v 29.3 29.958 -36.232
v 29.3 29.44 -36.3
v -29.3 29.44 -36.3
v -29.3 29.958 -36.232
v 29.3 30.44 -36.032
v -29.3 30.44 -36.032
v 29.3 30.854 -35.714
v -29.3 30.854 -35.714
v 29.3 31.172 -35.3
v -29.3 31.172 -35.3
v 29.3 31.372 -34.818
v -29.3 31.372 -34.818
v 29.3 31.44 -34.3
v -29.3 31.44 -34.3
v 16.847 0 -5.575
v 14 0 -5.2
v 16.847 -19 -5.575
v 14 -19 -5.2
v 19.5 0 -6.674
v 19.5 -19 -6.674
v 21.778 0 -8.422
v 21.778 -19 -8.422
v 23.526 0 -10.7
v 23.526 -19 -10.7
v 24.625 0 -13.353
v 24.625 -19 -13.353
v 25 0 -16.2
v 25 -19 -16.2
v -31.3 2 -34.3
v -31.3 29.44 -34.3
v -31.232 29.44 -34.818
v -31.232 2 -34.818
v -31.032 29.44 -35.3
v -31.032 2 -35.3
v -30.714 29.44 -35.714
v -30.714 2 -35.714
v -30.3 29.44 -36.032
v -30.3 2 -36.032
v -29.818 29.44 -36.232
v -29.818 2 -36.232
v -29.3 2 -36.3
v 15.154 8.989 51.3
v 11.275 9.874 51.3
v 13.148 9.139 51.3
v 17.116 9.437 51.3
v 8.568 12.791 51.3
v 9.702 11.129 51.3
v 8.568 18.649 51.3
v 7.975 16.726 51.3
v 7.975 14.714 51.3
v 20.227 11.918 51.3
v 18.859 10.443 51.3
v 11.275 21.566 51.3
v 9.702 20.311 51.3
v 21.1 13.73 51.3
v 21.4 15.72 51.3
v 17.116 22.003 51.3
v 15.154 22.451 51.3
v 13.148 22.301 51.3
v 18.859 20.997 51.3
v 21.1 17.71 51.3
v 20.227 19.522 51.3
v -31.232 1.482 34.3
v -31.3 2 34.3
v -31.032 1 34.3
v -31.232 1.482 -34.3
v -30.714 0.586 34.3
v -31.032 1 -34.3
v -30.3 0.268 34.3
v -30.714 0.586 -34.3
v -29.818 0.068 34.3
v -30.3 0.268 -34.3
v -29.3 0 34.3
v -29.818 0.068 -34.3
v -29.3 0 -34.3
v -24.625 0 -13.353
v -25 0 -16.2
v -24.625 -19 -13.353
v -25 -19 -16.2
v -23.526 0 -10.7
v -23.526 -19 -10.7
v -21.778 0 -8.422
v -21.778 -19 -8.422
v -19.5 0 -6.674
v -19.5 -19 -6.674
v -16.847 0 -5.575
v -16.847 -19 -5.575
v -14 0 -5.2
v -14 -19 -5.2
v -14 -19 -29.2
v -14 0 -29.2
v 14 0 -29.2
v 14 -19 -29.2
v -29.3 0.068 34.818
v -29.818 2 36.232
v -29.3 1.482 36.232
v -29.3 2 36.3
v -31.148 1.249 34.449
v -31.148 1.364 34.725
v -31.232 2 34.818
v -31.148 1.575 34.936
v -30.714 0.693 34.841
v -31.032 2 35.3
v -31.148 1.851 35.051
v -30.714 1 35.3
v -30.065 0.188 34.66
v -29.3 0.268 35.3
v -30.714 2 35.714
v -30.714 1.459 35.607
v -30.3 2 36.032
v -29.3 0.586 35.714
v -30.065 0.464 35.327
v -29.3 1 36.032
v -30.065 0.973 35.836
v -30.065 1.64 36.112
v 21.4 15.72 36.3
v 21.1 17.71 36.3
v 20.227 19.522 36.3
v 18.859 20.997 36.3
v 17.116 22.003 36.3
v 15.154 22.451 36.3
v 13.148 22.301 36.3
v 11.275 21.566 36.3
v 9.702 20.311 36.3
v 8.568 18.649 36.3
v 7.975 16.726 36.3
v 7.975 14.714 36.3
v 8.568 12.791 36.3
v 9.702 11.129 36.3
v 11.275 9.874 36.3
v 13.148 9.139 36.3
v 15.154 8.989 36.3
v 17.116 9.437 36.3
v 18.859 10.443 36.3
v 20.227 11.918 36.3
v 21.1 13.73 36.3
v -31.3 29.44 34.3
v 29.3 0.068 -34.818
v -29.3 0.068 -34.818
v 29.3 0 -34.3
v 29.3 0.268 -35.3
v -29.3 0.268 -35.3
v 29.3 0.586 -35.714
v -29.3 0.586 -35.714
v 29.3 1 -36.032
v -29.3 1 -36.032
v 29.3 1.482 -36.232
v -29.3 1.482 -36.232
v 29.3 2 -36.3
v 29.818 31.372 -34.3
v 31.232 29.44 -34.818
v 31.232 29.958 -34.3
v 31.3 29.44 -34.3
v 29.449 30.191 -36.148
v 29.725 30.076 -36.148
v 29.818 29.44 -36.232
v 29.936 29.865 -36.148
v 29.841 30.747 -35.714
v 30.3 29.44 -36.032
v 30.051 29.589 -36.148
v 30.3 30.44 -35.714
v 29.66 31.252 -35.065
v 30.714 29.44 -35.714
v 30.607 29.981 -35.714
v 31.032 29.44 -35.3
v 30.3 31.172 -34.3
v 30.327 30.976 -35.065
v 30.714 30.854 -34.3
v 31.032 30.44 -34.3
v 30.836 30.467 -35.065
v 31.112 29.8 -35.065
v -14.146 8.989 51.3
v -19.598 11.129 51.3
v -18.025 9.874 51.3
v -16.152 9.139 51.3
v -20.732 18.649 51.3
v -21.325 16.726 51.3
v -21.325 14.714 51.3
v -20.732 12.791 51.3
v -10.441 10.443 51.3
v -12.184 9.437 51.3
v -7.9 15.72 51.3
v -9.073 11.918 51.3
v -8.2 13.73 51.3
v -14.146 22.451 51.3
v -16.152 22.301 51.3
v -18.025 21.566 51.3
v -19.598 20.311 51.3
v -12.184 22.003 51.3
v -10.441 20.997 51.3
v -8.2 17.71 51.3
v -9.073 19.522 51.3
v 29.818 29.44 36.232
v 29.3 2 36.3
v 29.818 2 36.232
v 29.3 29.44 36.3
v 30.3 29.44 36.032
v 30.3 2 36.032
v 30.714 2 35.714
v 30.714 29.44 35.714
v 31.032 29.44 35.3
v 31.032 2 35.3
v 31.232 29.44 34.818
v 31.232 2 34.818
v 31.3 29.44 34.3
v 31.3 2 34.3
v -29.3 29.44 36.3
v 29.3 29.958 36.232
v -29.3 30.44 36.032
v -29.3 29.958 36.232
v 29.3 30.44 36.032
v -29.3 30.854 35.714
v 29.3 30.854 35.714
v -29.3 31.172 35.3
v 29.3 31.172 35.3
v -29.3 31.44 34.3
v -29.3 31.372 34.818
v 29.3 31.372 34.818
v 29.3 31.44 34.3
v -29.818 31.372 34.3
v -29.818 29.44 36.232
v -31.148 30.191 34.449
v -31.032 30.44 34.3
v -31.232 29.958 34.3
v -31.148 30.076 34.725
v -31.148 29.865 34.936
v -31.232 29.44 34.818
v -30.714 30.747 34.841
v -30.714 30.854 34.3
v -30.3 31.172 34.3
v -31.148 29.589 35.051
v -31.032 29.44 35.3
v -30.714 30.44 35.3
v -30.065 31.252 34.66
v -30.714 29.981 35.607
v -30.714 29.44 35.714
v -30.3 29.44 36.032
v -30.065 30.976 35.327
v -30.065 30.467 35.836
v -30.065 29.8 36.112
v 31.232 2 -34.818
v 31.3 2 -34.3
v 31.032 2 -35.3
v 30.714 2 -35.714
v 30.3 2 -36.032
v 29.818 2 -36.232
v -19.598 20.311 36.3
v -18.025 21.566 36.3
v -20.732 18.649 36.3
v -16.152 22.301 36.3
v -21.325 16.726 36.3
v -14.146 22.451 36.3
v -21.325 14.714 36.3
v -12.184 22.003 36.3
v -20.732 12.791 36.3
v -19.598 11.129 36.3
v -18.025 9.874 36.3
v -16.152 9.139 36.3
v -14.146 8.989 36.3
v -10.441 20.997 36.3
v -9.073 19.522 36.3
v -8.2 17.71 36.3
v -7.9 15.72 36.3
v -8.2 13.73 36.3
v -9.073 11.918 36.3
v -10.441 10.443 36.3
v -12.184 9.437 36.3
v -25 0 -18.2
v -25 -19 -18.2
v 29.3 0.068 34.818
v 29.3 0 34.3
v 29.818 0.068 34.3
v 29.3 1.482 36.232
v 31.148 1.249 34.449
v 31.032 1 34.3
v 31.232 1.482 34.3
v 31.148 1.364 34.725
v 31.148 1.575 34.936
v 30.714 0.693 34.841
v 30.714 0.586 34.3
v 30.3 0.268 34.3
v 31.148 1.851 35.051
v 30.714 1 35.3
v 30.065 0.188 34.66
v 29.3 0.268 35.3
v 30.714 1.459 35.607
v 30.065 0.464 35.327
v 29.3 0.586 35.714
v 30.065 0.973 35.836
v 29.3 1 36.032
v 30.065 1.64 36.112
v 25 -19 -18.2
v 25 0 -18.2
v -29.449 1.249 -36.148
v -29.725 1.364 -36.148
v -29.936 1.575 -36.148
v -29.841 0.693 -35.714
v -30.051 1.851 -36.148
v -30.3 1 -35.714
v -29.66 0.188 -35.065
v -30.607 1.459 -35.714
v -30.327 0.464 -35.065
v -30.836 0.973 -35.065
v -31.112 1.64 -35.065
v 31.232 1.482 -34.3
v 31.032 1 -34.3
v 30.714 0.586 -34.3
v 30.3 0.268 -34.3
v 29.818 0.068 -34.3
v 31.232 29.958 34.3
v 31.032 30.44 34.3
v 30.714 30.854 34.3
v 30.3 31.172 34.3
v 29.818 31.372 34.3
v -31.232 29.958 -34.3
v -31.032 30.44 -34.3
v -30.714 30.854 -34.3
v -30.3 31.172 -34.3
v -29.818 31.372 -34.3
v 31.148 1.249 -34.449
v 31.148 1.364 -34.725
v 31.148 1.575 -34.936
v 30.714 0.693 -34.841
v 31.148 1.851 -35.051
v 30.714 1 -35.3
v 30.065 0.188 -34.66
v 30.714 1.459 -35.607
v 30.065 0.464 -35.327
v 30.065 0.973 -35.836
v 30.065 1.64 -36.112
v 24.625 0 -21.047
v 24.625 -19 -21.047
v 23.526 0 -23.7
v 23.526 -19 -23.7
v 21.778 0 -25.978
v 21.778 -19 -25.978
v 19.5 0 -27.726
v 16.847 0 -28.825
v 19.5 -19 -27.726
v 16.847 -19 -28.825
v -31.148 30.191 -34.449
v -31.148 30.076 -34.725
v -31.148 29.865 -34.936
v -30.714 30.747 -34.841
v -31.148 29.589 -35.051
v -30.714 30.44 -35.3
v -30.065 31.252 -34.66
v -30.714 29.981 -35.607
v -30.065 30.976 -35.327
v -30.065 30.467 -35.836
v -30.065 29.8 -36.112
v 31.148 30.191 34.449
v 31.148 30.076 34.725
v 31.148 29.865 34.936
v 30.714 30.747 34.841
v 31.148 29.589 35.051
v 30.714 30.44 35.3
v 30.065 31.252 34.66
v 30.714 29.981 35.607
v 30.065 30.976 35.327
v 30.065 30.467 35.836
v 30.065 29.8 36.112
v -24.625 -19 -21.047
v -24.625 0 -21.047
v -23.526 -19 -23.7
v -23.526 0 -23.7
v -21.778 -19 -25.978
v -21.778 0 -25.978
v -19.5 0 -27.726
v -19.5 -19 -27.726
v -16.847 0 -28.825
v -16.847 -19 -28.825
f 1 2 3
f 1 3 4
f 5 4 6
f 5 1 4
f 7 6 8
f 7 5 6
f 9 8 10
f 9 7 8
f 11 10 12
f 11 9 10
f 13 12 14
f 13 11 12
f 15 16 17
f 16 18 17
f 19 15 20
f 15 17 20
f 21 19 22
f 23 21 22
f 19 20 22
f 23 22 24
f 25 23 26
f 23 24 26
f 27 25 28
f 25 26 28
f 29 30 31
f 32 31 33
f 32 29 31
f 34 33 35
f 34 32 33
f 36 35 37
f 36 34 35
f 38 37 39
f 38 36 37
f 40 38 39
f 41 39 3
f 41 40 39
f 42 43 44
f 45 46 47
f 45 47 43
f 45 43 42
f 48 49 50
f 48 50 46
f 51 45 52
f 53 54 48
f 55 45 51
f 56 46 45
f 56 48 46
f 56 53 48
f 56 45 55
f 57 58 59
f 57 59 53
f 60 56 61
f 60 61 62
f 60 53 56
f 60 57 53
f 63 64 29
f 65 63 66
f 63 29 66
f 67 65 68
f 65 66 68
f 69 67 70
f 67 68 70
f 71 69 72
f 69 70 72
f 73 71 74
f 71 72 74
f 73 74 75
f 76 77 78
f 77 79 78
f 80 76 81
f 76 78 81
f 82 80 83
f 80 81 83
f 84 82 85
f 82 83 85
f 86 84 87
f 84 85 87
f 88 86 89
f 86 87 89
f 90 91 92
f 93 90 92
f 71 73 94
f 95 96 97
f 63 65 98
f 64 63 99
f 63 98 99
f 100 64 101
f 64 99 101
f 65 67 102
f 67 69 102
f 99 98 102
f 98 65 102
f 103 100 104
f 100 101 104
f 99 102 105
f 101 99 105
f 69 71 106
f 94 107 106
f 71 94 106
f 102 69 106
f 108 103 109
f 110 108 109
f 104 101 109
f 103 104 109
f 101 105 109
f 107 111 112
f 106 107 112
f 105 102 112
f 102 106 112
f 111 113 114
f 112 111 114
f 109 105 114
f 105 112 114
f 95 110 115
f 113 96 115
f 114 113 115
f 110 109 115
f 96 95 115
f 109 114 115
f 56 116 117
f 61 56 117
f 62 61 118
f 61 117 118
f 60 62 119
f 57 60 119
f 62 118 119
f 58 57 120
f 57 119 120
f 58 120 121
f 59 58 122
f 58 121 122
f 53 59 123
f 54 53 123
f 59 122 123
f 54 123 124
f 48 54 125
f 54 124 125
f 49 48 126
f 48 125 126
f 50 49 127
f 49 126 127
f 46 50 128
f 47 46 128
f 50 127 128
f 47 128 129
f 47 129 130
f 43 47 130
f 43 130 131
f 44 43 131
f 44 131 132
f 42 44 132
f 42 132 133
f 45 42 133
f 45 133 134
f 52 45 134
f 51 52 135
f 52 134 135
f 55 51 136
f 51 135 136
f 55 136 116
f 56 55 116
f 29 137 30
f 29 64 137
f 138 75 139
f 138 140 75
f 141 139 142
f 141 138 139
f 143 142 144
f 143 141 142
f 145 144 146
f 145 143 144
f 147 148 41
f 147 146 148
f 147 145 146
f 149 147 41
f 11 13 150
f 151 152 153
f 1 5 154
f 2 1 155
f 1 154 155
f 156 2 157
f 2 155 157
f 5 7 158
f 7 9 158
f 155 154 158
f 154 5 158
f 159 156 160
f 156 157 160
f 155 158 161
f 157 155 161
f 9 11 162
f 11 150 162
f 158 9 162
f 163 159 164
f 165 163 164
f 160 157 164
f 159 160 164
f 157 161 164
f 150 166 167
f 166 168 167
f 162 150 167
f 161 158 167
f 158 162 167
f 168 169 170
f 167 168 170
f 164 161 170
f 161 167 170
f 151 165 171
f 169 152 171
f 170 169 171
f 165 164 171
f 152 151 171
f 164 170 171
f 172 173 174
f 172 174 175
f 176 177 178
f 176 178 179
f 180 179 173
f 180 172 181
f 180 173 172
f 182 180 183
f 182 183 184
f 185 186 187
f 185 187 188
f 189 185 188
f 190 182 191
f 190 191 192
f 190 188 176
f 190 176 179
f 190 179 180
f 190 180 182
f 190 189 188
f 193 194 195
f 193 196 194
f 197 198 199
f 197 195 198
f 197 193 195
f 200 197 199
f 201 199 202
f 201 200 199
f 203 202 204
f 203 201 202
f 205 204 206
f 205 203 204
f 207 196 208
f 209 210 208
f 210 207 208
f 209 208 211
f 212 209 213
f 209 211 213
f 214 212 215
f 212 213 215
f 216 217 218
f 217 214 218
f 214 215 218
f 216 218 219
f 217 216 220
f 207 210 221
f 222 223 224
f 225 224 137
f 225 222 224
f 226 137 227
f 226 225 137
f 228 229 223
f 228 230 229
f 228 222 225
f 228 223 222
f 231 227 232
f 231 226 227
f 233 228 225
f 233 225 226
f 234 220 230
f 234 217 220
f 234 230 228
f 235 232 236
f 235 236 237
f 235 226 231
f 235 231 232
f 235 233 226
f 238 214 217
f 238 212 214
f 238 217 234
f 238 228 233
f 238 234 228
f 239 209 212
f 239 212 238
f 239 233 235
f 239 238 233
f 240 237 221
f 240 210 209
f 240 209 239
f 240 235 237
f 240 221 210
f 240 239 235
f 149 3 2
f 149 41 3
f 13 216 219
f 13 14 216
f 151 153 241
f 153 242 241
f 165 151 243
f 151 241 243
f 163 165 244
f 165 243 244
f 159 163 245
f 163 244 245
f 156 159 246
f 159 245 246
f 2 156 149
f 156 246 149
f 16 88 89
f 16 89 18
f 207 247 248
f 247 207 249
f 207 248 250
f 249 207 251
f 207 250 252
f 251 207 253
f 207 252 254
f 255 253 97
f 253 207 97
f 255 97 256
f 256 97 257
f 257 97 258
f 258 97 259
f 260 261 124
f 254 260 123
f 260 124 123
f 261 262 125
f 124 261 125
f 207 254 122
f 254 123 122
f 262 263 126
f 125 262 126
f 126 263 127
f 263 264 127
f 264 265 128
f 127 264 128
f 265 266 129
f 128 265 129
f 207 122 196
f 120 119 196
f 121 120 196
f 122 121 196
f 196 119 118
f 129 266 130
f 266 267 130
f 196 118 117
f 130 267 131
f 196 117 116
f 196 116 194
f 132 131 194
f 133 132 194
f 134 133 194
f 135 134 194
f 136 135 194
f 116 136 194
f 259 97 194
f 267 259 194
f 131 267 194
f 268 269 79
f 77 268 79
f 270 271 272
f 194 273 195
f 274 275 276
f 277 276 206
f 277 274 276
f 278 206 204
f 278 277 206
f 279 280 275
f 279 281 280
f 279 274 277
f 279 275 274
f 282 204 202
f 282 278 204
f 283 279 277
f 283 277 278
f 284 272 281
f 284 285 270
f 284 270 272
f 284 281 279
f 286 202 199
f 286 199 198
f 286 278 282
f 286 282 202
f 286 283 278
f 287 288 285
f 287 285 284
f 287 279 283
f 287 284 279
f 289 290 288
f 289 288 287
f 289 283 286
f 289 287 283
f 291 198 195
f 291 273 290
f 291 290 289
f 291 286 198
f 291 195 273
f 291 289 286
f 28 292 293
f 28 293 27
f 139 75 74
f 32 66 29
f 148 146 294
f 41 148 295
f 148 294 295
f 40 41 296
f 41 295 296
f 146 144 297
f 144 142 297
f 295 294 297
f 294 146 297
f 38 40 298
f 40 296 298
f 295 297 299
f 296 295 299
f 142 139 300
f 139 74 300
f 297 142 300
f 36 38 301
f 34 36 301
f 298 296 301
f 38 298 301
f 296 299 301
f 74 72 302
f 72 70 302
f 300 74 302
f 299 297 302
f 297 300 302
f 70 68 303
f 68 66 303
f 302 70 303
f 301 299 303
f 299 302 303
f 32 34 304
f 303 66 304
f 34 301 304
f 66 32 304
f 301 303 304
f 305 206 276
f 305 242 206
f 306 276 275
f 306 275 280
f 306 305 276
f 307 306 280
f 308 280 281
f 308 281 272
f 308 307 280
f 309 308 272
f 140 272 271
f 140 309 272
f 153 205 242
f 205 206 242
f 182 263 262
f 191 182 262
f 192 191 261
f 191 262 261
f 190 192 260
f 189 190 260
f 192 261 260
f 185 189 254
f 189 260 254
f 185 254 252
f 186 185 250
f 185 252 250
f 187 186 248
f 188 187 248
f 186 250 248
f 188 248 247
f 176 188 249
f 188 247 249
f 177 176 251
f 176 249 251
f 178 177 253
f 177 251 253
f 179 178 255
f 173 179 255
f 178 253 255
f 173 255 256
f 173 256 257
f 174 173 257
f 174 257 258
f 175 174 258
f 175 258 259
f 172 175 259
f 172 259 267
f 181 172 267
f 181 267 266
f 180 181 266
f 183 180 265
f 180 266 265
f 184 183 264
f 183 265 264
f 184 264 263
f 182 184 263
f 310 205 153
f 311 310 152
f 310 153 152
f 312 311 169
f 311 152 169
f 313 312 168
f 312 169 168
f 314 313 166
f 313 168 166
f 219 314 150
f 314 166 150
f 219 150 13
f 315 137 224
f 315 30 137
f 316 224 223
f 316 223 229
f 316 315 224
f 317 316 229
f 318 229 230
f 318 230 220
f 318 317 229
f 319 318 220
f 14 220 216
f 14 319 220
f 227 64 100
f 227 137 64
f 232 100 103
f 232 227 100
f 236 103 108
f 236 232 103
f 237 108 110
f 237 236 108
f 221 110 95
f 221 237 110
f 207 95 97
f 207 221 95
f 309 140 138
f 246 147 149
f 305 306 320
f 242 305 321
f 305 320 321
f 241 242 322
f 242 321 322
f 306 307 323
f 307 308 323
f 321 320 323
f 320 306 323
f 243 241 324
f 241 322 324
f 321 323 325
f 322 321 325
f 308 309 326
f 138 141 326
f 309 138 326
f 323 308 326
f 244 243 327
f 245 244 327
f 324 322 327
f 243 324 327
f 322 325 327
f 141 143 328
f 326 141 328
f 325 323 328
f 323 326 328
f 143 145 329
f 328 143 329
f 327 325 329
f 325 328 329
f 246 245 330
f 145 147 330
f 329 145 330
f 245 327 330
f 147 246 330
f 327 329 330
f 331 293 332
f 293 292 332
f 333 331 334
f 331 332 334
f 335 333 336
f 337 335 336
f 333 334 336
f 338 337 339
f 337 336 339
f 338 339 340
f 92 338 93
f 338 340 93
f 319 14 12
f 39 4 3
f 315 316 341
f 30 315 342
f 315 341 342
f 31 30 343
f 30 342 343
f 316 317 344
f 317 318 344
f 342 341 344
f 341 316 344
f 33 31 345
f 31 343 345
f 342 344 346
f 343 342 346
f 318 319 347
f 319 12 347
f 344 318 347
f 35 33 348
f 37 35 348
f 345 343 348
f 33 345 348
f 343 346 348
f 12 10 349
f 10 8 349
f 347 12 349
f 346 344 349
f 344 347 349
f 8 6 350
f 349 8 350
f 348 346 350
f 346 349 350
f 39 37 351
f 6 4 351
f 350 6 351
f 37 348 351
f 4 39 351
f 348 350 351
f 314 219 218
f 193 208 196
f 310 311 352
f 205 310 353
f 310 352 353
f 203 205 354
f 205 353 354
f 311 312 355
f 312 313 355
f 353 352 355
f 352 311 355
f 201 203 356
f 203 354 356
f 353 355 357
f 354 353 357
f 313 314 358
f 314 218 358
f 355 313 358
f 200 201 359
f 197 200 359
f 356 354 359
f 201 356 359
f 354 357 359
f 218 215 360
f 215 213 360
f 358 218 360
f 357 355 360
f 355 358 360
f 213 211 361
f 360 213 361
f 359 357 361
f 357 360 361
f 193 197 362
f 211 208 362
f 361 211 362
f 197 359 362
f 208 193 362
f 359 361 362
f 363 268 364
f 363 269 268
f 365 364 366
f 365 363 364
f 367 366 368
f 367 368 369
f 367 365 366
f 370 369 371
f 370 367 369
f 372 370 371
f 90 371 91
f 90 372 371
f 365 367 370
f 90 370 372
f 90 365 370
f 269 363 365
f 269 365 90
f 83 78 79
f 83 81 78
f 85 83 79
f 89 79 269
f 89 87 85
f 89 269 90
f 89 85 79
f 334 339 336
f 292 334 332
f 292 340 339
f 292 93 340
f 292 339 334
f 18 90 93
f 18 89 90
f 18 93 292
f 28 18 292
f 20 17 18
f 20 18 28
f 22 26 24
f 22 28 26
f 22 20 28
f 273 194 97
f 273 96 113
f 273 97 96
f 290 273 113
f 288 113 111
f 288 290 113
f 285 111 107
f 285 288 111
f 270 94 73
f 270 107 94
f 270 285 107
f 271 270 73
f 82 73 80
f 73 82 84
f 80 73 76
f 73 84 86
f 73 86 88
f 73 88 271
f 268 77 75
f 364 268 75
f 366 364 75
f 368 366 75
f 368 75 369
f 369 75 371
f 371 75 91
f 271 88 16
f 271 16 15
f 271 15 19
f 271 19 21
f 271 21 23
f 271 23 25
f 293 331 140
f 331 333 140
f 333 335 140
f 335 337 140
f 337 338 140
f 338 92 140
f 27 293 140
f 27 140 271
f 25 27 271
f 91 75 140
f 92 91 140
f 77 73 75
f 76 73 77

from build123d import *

# Parameters (mm, degrees)
SKETCH1_W           = 62.6
SKETCH1_H           = 72.6
BOSS_EXTRUDE1_DEPTH = 24.14
SKETCH2_W           = 50
SKETCH2_H           = 24
BOSS_EXTRUDE2_DEPTH = 19
SKETCH3_W           = 62.6
SKETCH3_H           = 72.6
BOSS_EXTRUDE3_DEPTH = 7.3
FILLET1_R           = 2
FILLET2_R           = 11
SKETCH4_R           = 6.75
BOSS_EXTRUDE4_DEPTH = 15


with BuildPart() as part:
    # Sketch1 → Boss-Extrude1 (new body)
    with BuildSketch(Plane(origin=(0, 0, 0), x_dir=(1, 0, 0), z_dir=(0, 1, 0))):
        Rectangle(SKETCH1_W, SKETCH1_H)
    extrude(amount=BOSS_EXTRUDE1_DEPTH)

    # Sketch2 → Boss-Extrude2 (add)
    with BuildSketch(Plane.XZ):
        with Locations((0, -17.2)):
            Rectangle(SKETCH2_W, SKETCH2_H)
    extrude(amount=BOSS_EXTRUDE2_DEPTH)

    # Sketch3 → Boss-Extrude3 (add)
    with BuildSketch(Plane(origin=(0, 24.14, 0), x_dir=(1, 0, 0), z_dir=(0, 1, 0))):
        Rectangle(SKETCH3_W, SKETCH3_H)
    extrude(amount=BOSS_EXTRUDE3_DEPTH)

    # Fillet1
    fillet1_edges = [part.edges().sort_by_distance(p)[0] for p in [
        (0, 31.44, 36.3),
        (31.3, 31.44, 0),
        (0, 31.44, -36.3),
        (-31.3, 31.44, 0),
        (0, 0, 36.3),
        (-31.3, 0, 0),
        (0, 0, -36.3),
        (31.3, 0, 0),
        (31.3, 15.72, 36.3),
        (-31.3, 15.72, 36.3),
        (-31.3, 15.72, -36.3),
        (31.3, 15.72, -36.3),
    ]]
    fillet(fillet1_edges, radius=FILLET1_R)

    # Fillet2
    fillet2_edges = [part.edges().sort_by_distance(p)[0] for p in [
        (-25, -9.5, -5.2),
        (-25, -9.5, -29.2),
        (25, -9.5, -29.2),
        (25, -9.5, -5.2),
    ]]
    fillet(fillet2_edges, radius=FILLET2_R)

    # Sketch4 → Boss-Extrude4 (add)
    with BuildSketch(Plane.XY.offset(36.3)):
        with Locations((-14.64999991, 15.7200005)):
            Circle(SKETCH4_R)
        with Locations((14.64999991, 15.7200005)):
            Circle(SKETCH4_R)
    extrude(amount=BOSS_EXTRUDE4_DEPTH)


solid = part.part
